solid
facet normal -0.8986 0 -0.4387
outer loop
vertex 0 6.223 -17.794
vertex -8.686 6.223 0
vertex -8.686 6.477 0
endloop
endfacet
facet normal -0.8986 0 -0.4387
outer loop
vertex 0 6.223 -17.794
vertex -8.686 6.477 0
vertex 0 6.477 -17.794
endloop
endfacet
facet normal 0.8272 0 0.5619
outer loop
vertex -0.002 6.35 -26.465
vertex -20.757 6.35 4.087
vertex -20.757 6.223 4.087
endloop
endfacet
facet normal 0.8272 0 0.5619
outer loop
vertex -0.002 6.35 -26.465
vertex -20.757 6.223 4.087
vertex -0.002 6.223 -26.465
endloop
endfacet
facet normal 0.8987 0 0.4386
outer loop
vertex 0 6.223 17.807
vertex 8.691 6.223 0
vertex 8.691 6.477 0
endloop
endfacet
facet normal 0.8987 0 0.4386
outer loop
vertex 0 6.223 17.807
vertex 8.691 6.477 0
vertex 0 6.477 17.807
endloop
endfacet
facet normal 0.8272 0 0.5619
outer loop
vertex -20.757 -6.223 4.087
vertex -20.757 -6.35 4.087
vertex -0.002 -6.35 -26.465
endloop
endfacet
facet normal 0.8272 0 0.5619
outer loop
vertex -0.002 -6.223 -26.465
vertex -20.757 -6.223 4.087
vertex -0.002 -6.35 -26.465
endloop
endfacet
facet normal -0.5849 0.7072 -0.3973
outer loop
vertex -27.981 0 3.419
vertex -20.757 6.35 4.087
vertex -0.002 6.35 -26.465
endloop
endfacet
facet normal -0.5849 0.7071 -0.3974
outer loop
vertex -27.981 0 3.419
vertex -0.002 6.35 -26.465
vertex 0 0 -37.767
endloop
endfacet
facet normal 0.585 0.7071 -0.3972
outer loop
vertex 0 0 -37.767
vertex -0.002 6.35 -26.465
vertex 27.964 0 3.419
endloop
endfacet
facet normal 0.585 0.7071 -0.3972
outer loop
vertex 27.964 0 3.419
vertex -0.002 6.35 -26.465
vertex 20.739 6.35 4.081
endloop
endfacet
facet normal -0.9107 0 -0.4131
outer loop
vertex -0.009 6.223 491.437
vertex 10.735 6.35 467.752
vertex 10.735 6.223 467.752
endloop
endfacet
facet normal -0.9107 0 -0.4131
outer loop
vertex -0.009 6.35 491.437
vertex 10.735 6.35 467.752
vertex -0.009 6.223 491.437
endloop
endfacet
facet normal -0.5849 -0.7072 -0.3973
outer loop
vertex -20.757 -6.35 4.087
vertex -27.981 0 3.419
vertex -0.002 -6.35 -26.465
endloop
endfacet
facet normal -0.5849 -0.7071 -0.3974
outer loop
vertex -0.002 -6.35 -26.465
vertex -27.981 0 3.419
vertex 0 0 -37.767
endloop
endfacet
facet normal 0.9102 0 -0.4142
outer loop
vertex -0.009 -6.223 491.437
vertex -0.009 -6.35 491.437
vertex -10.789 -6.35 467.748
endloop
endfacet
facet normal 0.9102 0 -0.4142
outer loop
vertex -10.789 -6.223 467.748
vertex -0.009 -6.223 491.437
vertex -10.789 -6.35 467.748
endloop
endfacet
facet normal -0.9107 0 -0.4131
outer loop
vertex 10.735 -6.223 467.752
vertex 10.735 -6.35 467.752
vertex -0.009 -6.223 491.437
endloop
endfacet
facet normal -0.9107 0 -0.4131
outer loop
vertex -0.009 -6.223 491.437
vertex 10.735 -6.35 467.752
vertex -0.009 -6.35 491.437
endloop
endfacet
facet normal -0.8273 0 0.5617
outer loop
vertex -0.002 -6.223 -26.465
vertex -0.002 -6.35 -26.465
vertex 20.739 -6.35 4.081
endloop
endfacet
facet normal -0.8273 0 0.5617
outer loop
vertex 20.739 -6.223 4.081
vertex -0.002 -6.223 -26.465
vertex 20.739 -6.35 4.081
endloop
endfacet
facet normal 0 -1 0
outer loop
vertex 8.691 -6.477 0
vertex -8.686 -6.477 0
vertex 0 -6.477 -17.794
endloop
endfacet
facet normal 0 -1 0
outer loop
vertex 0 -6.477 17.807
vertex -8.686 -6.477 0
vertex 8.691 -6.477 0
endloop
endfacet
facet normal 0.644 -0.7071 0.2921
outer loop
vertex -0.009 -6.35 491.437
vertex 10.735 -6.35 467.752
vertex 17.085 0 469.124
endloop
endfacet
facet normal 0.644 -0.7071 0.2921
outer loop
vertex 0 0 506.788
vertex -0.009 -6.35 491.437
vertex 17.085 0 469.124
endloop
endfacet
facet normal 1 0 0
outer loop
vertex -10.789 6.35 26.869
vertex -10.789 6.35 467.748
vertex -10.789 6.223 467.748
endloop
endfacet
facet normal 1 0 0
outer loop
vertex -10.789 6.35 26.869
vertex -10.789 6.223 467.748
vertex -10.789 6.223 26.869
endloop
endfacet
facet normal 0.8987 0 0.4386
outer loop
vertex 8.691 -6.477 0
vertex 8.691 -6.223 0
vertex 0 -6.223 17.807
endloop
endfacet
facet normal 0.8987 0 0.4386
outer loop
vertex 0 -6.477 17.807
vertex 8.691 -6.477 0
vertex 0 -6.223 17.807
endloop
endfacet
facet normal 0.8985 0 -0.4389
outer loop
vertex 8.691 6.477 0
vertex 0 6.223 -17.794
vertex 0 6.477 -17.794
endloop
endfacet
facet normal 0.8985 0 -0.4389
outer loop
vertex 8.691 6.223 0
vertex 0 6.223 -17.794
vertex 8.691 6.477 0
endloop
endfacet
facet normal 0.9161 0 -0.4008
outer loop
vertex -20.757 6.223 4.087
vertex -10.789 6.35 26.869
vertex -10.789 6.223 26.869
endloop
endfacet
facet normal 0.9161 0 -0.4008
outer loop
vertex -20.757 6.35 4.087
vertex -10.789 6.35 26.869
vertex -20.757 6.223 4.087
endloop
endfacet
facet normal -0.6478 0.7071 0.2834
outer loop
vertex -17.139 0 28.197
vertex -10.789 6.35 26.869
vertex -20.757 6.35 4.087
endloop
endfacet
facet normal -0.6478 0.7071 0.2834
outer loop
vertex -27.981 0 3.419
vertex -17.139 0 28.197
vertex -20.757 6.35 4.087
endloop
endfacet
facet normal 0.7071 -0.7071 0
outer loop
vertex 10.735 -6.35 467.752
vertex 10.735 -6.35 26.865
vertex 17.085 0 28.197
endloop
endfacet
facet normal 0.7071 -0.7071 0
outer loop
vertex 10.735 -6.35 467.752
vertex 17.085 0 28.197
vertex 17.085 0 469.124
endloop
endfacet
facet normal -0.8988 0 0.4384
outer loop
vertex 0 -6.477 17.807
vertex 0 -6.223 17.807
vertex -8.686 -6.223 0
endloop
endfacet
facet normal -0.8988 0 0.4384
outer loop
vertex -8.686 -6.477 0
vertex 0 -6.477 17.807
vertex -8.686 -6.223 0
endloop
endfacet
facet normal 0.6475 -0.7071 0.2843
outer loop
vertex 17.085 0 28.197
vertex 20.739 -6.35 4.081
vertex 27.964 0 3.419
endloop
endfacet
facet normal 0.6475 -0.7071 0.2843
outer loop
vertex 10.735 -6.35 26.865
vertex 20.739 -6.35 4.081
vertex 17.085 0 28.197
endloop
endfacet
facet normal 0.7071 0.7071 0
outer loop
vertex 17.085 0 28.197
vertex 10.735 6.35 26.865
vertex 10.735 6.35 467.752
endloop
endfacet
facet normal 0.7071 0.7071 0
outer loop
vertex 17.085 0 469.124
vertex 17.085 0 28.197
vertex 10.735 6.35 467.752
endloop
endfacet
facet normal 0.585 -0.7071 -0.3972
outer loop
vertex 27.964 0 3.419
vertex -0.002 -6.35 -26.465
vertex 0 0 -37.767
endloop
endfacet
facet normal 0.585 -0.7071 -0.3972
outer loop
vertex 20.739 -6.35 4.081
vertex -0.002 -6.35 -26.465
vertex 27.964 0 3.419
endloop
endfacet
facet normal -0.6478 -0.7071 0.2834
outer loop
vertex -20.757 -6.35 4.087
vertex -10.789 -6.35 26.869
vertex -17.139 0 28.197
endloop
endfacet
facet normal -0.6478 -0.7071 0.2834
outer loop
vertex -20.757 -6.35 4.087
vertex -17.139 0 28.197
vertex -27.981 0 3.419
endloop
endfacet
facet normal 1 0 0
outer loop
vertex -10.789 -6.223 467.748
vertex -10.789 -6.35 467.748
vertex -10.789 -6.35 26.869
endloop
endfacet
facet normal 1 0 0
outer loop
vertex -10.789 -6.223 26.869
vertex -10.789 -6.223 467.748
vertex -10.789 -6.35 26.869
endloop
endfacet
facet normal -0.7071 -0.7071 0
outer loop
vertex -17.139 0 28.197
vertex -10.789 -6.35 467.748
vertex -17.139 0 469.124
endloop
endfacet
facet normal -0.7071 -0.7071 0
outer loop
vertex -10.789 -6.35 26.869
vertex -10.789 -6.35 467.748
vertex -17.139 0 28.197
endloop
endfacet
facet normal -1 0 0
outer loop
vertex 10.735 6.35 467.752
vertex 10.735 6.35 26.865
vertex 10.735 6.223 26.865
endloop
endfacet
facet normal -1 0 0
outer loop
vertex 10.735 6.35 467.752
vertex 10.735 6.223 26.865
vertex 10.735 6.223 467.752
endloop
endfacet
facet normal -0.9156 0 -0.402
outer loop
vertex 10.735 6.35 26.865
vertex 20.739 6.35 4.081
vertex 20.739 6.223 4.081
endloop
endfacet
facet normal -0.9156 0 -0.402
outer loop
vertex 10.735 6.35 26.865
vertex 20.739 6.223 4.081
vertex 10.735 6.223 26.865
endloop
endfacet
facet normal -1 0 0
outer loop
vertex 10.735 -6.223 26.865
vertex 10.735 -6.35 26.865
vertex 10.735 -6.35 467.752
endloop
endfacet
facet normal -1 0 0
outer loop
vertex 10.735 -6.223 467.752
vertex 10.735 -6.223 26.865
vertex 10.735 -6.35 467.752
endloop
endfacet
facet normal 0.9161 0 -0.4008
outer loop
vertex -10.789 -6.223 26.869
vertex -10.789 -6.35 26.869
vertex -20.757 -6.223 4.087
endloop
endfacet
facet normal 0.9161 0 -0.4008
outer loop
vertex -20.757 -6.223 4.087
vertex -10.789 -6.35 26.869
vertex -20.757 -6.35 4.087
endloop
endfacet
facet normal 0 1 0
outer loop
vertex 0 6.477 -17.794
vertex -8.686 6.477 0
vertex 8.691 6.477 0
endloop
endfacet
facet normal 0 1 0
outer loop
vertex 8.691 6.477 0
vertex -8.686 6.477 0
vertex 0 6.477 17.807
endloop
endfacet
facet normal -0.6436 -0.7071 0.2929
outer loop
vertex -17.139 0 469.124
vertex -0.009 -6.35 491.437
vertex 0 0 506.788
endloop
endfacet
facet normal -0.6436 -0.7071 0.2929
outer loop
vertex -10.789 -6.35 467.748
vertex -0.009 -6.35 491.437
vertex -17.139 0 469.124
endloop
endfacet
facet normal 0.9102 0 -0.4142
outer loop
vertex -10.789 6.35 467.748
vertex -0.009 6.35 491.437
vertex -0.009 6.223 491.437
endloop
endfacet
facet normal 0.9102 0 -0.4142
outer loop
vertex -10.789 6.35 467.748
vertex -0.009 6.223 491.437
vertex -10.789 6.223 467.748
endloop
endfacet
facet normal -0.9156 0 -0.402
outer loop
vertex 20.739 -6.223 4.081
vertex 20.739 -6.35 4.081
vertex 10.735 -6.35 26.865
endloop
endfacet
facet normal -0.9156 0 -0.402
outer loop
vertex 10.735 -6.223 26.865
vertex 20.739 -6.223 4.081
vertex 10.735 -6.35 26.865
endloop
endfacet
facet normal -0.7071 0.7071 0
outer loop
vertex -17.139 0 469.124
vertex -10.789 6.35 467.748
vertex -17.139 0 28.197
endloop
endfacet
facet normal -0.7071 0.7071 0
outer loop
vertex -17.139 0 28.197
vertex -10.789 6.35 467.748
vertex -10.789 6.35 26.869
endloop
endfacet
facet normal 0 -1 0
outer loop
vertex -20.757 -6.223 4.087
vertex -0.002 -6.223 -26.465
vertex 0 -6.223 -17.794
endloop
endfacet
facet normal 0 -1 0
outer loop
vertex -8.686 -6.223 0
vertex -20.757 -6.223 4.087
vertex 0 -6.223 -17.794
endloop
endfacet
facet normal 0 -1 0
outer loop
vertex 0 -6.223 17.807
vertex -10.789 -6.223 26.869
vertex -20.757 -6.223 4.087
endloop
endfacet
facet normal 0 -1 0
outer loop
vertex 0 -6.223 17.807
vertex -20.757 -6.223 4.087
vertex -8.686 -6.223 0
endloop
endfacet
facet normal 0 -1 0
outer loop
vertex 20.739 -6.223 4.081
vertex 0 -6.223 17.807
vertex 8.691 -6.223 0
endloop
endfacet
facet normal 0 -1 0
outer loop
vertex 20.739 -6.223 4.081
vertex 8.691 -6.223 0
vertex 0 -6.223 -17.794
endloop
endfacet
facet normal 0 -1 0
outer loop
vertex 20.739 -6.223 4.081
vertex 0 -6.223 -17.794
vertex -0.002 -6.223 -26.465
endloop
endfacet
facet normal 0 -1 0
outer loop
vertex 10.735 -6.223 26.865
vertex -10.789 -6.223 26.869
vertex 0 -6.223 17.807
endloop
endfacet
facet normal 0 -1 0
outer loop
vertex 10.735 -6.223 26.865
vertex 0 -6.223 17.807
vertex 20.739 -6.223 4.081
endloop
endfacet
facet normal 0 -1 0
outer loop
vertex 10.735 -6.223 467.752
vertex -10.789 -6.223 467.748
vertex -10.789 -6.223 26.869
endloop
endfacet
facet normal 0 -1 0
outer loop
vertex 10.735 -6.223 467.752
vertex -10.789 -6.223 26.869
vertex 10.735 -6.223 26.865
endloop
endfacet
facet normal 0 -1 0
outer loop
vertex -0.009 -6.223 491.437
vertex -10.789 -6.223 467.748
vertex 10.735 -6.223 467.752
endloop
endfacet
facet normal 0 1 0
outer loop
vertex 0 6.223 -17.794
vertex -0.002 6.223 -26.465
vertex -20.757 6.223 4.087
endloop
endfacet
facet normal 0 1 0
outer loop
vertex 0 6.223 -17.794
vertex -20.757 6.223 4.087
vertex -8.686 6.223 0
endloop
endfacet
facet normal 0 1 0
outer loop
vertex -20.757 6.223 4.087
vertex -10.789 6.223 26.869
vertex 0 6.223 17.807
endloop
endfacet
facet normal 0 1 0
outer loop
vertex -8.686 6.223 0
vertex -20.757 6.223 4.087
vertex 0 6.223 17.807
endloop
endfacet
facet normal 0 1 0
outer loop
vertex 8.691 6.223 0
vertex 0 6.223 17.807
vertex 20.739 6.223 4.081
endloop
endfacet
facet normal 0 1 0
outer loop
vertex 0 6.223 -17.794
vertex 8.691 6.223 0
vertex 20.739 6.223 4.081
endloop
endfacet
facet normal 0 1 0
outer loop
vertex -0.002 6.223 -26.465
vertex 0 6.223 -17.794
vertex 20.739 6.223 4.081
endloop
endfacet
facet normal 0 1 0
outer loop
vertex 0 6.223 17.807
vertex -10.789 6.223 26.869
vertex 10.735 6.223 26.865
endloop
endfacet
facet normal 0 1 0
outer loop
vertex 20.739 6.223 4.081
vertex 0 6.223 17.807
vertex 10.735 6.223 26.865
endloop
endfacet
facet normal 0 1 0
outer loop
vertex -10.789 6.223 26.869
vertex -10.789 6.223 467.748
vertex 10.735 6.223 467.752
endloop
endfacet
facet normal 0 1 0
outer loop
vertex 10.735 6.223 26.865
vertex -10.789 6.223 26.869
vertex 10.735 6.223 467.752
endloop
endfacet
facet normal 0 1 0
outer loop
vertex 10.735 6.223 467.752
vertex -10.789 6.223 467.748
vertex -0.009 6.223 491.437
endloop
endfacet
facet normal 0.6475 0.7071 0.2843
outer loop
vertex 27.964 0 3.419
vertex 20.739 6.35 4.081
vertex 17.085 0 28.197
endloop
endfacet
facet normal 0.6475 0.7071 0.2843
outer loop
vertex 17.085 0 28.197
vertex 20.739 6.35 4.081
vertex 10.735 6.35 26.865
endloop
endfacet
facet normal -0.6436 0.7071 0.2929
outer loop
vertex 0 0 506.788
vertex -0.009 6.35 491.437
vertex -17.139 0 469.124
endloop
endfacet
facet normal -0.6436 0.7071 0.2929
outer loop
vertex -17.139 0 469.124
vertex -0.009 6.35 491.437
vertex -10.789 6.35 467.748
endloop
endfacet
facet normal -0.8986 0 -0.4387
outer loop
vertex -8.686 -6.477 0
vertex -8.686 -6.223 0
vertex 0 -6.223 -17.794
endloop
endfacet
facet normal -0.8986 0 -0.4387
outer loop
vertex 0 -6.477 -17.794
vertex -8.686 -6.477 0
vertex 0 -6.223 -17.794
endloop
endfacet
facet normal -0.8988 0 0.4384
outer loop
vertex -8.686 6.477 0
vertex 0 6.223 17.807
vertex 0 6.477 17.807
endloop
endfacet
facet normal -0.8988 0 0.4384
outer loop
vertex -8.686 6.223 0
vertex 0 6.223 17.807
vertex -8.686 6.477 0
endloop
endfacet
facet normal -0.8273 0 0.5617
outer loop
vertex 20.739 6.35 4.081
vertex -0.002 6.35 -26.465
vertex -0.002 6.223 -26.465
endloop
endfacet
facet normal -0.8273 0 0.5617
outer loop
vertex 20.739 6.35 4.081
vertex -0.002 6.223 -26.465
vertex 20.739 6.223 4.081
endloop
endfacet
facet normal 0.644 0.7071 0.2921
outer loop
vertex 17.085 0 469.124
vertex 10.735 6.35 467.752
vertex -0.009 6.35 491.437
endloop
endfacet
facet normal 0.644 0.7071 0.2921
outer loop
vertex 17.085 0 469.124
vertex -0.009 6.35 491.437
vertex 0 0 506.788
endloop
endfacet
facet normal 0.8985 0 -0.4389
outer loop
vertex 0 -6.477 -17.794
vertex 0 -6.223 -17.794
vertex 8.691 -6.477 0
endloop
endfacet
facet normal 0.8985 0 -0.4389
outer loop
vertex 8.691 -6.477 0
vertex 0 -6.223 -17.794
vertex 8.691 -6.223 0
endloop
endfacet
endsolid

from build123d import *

# Parameters (mm, degrees)
F1_DEPTH = 6.35
F2_DEPTH = 6.35
F3_SIZE2 = 6.34999
F3_SIZE  = 6.34999
F4_DEPTH = 0.127
F5_DEPTH = 0.127
F7_DEPTH = 0.254
F8_DEPTH = 12.954


# Not quite as in the source:
# - a fillet or chamfer is up to 0.001 mm smaller than in the source, because OpenCascade refuses the exact size


with BuildPart() as f1:
    # F0 (on Front) → F1 (new body)
    with BuildSketch(Plane.XZ):
        Polygon((-17.139416188, 28.1973872334), (-27.9807504267, 3.4191238228), (0, -37.7674587071), (27.964355424, 3.4191238228), (17.08493568, 28.1973872334), (17.08493568, 469.1244959831), (0, 506.7884922028), (-17.139416188, 469.1244959831), align=None)
    extrude(amount=F1_DEPTH)

    # F2 (add): a face of the model
    f2_faces = [f1.faces().sort_by_distance(p)[0] for p in [
        (-0.0248835797, 0, 225.9211420486),
    ]]
    extrude(f2_faces, amount=F2_DEPTH)

    # F3 (size 6.35 and 6.35 in the source; OpenCascade refuses exactly that, so slightly less here)
    f3_edges = [f1.edges().sort_by_distance(p)[0] for p in [
        (-22.560083, -6.35, 15.808256),
        (-13.990375, -6.35, -17.174167),
        (13.982178, -6.35, -17.174167),
        (22.524646, -6.35, 15.808256),
        (17.084936, -6.35, 248.660942),
        (8.542468, -6.35, 487.956494),
        (-8.569708, -6.35, 487.956494),
        (-17.139416, -6.35, 248.660942),
        (-22.560083, 6.35, 15.808256),
        (-13.990375, 6.35, -17.174167),
        (13.982178, 6.35, -17.174167),
        (22.524646, 6.35, 15.808256),
        (17.084936, 6.35, 248.660942),
        (8.542468, 6.35, 487.956494),
        (-8.569708, 6.35, 487.956494),
        (-17.139416, 6.35, 248.660942),
    ]]
    chamfer(f3_edges, length=F3_SIZE, length2=F3_SIZE2)

    # F4 (cut): a face of the model
    f4_faces = [f1.faces().sort_by_distance(p)[0] for p in [
        (-0.0252861091, -6.35, 223.0026633937),
    ]]
    extrude(f4_faces, amount=-F4_DEPTH, mode=Mode.SUBTRACT)

    # F5 (cut): a face of the model
    f5_faces = [f1.faces().sort_by_distance(p)[0] for p in [
        (-0.0252861091, 6.35, 223.0026633937),
    ]]
    extrude(f5_faces, amount=-F5_DEPTH, mode=Mode.SUBTRACT)

    # F6 (on face) → F7 (join)
    with BuildSketch(Plane.XZ.offset(6.223)):
        Polygon((8.6913099512, 0), (0, 17.8065411747), (-8.6860535666, 0), (0, -17.7944861352), align=None)
    extrude(amount=F7_DEPTH)

    # F8 (add): a face of the model
    f8_faces = [f1.faces().sort_by_distance(p)[0] for p in [
        (0.0017521282, -6.477, 0.0040183465),
    ]]
    extrude(f8_faces, amount=-F8_DEPTH)


solid = f1.part
